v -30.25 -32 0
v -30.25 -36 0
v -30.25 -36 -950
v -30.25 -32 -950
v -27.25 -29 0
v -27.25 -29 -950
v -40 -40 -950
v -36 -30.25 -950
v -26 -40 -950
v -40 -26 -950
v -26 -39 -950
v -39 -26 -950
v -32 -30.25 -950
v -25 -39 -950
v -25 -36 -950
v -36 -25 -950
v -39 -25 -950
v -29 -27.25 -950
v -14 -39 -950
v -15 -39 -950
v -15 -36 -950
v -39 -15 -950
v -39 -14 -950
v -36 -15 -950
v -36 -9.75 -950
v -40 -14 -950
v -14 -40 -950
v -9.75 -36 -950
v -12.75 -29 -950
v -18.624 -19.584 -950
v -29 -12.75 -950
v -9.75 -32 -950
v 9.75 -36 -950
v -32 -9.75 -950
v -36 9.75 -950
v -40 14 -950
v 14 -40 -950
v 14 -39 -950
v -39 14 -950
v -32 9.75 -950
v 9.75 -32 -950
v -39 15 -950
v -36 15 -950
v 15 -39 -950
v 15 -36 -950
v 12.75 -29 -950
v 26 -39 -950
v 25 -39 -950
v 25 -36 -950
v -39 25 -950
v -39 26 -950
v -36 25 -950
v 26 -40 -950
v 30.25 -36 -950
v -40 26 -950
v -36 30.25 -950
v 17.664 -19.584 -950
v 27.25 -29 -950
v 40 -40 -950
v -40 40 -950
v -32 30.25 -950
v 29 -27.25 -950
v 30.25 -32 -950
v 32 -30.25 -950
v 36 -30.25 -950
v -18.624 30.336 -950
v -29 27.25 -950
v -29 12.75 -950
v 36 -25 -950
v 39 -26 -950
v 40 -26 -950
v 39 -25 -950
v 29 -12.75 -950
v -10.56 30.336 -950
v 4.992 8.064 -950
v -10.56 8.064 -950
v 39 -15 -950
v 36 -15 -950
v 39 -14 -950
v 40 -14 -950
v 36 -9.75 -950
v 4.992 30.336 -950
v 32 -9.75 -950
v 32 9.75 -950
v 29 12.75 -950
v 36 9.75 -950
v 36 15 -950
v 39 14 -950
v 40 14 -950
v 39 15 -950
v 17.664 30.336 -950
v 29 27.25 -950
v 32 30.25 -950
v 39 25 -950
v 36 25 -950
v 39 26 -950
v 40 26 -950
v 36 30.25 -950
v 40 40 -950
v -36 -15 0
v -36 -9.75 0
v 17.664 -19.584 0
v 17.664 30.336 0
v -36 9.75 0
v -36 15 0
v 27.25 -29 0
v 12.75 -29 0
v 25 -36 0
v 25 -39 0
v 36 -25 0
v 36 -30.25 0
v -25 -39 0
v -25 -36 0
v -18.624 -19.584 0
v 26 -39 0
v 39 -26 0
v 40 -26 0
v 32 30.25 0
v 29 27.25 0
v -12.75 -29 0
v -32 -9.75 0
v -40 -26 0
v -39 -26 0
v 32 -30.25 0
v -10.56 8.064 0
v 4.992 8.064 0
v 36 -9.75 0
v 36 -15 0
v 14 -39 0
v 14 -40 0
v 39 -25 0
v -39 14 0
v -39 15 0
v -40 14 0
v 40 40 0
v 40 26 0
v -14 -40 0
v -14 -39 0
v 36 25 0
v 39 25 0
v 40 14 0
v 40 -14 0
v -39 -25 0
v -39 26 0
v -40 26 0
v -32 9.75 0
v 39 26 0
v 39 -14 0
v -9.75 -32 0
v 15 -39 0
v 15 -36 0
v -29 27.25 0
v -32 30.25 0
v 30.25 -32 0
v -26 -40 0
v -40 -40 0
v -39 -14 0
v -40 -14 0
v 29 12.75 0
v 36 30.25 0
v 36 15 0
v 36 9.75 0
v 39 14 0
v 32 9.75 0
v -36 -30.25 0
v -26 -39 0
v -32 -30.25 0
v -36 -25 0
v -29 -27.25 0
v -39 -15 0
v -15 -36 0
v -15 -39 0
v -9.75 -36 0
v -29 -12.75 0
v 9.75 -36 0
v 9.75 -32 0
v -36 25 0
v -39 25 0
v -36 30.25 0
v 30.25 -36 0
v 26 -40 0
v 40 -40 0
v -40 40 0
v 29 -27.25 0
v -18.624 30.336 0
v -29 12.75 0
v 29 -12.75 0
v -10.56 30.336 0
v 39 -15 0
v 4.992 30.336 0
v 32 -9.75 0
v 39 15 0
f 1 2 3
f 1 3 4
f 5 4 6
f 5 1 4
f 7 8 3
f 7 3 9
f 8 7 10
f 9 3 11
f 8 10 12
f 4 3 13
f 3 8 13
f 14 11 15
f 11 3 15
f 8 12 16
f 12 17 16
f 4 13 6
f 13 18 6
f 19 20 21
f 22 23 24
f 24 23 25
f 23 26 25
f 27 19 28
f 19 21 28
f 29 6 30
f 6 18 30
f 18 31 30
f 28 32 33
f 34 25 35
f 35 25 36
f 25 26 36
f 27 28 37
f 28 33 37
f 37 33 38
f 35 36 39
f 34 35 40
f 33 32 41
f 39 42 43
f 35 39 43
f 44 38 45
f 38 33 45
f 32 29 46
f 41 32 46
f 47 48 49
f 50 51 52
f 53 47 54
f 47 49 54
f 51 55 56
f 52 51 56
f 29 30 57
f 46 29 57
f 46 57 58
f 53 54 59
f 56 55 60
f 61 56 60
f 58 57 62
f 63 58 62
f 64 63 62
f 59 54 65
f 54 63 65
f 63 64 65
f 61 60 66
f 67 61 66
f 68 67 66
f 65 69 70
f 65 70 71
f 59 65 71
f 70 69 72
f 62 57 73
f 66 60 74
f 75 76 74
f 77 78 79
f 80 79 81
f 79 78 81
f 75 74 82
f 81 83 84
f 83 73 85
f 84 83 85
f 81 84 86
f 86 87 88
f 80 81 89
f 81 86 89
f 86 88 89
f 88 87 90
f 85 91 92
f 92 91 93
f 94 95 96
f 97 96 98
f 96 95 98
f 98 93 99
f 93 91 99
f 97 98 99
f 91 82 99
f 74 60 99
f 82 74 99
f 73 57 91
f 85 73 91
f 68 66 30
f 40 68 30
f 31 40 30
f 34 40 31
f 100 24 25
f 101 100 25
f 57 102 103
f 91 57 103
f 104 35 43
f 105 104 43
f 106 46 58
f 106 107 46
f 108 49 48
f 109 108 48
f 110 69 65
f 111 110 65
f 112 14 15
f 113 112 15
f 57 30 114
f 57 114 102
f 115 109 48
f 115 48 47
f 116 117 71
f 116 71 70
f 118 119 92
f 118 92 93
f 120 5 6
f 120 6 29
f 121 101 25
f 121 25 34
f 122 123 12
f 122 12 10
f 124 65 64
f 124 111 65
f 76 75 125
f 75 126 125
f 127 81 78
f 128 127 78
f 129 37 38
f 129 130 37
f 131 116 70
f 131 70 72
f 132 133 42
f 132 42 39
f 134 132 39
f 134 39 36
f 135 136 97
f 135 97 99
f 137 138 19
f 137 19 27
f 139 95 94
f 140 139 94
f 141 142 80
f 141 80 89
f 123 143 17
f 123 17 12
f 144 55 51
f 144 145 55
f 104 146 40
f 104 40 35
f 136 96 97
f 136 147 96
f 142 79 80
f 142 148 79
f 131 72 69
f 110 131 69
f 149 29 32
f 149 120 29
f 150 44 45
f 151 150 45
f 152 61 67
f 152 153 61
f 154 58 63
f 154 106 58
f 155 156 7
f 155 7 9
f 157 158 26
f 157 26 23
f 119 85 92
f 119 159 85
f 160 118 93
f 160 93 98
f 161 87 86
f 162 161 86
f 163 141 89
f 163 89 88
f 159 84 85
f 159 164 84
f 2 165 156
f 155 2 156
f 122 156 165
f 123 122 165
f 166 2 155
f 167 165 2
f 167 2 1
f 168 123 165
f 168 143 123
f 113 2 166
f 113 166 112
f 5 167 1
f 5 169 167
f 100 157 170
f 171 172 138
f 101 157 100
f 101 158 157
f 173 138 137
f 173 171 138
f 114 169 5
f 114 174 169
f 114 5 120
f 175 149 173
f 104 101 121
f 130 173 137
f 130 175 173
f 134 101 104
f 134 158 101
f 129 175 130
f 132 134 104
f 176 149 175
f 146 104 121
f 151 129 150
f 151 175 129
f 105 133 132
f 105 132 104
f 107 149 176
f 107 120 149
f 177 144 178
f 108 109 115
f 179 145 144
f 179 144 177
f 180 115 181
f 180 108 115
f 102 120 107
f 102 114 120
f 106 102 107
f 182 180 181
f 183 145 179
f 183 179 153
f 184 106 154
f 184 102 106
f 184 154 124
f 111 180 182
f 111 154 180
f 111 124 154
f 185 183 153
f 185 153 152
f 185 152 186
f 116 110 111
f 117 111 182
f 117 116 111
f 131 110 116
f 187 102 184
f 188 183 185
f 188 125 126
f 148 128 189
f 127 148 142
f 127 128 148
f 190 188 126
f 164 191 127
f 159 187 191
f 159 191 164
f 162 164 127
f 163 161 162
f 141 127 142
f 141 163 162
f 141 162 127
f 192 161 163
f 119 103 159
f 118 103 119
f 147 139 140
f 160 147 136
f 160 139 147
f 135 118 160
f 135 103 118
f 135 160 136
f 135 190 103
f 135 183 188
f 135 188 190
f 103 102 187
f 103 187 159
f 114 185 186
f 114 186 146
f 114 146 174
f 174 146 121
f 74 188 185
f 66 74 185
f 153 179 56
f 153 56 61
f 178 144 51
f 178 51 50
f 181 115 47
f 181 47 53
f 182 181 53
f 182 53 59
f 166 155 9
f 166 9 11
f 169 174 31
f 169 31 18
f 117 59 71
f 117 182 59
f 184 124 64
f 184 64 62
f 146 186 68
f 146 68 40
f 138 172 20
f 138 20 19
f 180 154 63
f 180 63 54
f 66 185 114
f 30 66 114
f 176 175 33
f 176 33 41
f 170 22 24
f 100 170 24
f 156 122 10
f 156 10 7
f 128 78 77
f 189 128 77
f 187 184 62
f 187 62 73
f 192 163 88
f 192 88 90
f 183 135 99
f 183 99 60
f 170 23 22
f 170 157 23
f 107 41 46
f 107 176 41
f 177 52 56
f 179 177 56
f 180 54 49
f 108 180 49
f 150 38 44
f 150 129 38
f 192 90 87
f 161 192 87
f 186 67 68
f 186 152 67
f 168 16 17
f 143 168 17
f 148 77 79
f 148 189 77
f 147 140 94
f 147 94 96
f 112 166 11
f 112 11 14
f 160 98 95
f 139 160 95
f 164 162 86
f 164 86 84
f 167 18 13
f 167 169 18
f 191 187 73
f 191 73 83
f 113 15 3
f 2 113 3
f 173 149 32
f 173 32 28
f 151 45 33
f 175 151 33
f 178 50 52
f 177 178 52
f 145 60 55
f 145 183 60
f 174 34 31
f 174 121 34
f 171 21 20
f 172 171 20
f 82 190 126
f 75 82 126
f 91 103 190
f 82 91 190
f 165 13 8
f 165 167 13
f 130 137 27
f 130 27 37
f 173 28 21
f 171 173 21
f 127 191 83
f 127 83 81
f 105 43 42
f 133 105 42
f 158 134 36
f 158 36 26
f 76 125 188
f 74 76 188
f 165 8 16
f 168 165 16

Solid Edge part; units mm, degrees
sketch "Sketch1" plane through (0, 0, 0) normal (0, 0, 1) x (1, 0, 0)
  line L0 (-40, 40) -> (-40, -40)
  line L1 (-40, -40) -> (40, -40)
  line L2 (40, -40) -> (40, 40)
  line L3 (40, 40) -> (-40, 40)
  dimension "D1" = 80
  dimension "D2" = 80
extrude "Protrusion1" add sketch "Sketch1" against normal blind 950
sketch "Sketch2" plane through (0, 0, 0) normal (0, 0, 1) x (0, 1, 0)
  line L0 (-26, 40) -> (-14, 40)
  line L1 (-14, 40) -> (-14, 39)
  line L2 (-14, 39) -> (-15, 39)
  line L3 (-15, 39) -> (-15, 36)
  line L4 (-15, 36) -> (-9.75, 36)
  line L5 (-9.75, 36) -> (-9.75, 32)
  line L6 (-9.75, 32) -> (-12.75, 29)
  line L7 (-12.75, 29) -> (-27.25, 29)
  line L8 (-27.25, 29) -> (-30.25, 32)
  line L9 (-30.25, 32) -> (-30.25, 36)
  line L10 (-30.25, 36) -> (-25, 36)
  line L11 (-25, 36) -> (-25, 38.8333)
  line L12 (-25, 38.8333) -> (-25, 39)
  line L13 (-25, 39) -> (-26, 39)
  line L14 (-26, 39) -> (-26, 40)
  line L15 (15, 36) -> (15, 39)
  line L16 (15, 39) -> (14, 39)
  line L17 (14, 39) -> (14, 40)
  line L18 (14, 40) -> (26, 40)
  line L19 (26, 40) -> (26, 39)
  line L20 (26, 39) -> (25, 39)
  line L21 (25, 39) -> (25, 36)
  line L22 (25, 36) -> (30.25, 36)
  line L23 (30.25, 36) -> (30.25, 32)
  line L24 (30.25, 32) -> (27.25, 29)
  line L25 (27.25, 29) -> (12.75, 29)
  line L26 (12.75, 29) -> (9.75, 32)
  line L27 (9.75, 32) -> (9.75, 36)
  line L28 (9.75, 36) -> (15, 36)
  line L29 (-40, -14) -> (-39, -14)
  line L30 (-39, -14) -> (-39, -15)
  line L31 (-39, -15) -> (-36, -15)
  line L32 (-36, -15) -> (-36, -9.75)
  line L33 (-36, -9.75) -> (-32, -9.75)
  line L34 (-32, -9.75) -> (-29, -12.75)
  line L35 (-29, -12.75) -> (-29, -27.25)
  line L36 (-29, -27.25) -> (-32, -30.25)
  line L37 (-32, -30.25) -> (-36, -30.25)
  line L38 (-36, -30.25) -> (-36, -25)
  line L39 (-36, -25) -> (-39, -25)
  line L40 (-39, -25) -> (-39, -26)
  line L41 (-39, -26) -> (-40, -26)
  line L42 (-40, -14) -> (-40, -26)
  line L43 (-26, -40) -> (-26, -39)
  line L44 (-26, -39) -> (-25, -39)
  line L45 (-25, -39) -> (-25, -36)
  line L46 (-25, -36) -> (-30.25, -36)
  line L47 (-30.25, -36) -> (-30.25, -32)
  line L48 (-30.25, -32) -> (-27.25, -29)
  line L49 (-27.25, -29) -> (-12.75, -29)
  line L50 (-12.75, -29) -> (-9.75, -32)
  line L51 (-9.75, -32) -> (-9.75, -36)
  line L52 (-9.75, -36) -> (-15, -36)
  line L53 (-15, -36) -> (-15, -39)
  line L54 (-15, -39) -> (-14, -39)
  line L55 (-14, -39) -> (-14, -40)
  line L56 (-26, -40) -> (-14, -40)
  line L57 (14, -40) -> (14, -39)
  line L58 (14, -39) -> (15, -39)
  line L59 (15, -39) -> (15, -36)
  line L60 (15, -36) -> (9.75, -36)
  line L61 (9.75, -36) -> (9.75, -32)
  line L62 (9.75, -32) -> (12.75, -29)
  line L63 (12.75, -29) -> (27.25, -29)
  line L64 (27.25, -29) -> (30.25, -32)
  line L65 (30.25, -32) -> (30.25, -36)
  line L66 (30.25, -36) -> (25, -36)
  line L67 (25, -36) -> (25, -39)
  line L68 (25, -39) -> (26, -39)
  line L69 (26, -39) -> (26, -40)
  line L70 (26, -40) -> (14, -40)
  line L71 (-36, 25) -> (-36, 30.25)
  line L72 (-36, 30.25) -> (-32, 30.25)
  line L73 (-32, 30.25) -> (-29, 27.25)
  line L74 (-29, 27.25) -> (-29, 12.75)
  line L75 (-29, 12.75) -> (-32, 9.75)
  line L76 (-32, 9.75) -> (-36, 9.75)
  line L77 (-36, 9.75) -> (-36, 15)
  line L78 (-36, 15) -> (-39, 15)
  line L79 (-39, 15) -> (-39, 14)
  line L80 (-39, 14) -> (-40, 14)
  line L81 (-40, 14) -> (-40, 26)
  line L82 (-40, 26) -> (-39, 26)
  line L83 (-39, 26) -> (-39, 25)
  line L84 (-39, 25) -> (-36, 25)
extrude "Cutout1" cut sketch "Sketch2" against normal through all
sketch "Sketch3" plane through (0, 0, 0) normal (0, 0, 1) x (0, 1, 0)
  line L0 (30.336, 18.624) -> (-19.584, 18.624)
  line L1 (-19.584, 18.624) -> (-19.584, -17.664)
  line L2 (-19.584, -17.664) -> (30.336, -17.664)
  line L3 (30.336, -17.664) -> (30.336, -4.992)
  line L4 (30.336, -4.992) -> (8.064, -4.992)
  line L5 (8.064, -4.992) -> (8.064, 10.56)
  line L6 (8.064, 10.56) -> (30.336, 10.56)
  line L7 (30.336, 10.56) -> (30.336, 18.624)
extrude "Cutout2" cut sketch "Sketch3" against normal through all
properties material "Aluminum, 6061-T6"
